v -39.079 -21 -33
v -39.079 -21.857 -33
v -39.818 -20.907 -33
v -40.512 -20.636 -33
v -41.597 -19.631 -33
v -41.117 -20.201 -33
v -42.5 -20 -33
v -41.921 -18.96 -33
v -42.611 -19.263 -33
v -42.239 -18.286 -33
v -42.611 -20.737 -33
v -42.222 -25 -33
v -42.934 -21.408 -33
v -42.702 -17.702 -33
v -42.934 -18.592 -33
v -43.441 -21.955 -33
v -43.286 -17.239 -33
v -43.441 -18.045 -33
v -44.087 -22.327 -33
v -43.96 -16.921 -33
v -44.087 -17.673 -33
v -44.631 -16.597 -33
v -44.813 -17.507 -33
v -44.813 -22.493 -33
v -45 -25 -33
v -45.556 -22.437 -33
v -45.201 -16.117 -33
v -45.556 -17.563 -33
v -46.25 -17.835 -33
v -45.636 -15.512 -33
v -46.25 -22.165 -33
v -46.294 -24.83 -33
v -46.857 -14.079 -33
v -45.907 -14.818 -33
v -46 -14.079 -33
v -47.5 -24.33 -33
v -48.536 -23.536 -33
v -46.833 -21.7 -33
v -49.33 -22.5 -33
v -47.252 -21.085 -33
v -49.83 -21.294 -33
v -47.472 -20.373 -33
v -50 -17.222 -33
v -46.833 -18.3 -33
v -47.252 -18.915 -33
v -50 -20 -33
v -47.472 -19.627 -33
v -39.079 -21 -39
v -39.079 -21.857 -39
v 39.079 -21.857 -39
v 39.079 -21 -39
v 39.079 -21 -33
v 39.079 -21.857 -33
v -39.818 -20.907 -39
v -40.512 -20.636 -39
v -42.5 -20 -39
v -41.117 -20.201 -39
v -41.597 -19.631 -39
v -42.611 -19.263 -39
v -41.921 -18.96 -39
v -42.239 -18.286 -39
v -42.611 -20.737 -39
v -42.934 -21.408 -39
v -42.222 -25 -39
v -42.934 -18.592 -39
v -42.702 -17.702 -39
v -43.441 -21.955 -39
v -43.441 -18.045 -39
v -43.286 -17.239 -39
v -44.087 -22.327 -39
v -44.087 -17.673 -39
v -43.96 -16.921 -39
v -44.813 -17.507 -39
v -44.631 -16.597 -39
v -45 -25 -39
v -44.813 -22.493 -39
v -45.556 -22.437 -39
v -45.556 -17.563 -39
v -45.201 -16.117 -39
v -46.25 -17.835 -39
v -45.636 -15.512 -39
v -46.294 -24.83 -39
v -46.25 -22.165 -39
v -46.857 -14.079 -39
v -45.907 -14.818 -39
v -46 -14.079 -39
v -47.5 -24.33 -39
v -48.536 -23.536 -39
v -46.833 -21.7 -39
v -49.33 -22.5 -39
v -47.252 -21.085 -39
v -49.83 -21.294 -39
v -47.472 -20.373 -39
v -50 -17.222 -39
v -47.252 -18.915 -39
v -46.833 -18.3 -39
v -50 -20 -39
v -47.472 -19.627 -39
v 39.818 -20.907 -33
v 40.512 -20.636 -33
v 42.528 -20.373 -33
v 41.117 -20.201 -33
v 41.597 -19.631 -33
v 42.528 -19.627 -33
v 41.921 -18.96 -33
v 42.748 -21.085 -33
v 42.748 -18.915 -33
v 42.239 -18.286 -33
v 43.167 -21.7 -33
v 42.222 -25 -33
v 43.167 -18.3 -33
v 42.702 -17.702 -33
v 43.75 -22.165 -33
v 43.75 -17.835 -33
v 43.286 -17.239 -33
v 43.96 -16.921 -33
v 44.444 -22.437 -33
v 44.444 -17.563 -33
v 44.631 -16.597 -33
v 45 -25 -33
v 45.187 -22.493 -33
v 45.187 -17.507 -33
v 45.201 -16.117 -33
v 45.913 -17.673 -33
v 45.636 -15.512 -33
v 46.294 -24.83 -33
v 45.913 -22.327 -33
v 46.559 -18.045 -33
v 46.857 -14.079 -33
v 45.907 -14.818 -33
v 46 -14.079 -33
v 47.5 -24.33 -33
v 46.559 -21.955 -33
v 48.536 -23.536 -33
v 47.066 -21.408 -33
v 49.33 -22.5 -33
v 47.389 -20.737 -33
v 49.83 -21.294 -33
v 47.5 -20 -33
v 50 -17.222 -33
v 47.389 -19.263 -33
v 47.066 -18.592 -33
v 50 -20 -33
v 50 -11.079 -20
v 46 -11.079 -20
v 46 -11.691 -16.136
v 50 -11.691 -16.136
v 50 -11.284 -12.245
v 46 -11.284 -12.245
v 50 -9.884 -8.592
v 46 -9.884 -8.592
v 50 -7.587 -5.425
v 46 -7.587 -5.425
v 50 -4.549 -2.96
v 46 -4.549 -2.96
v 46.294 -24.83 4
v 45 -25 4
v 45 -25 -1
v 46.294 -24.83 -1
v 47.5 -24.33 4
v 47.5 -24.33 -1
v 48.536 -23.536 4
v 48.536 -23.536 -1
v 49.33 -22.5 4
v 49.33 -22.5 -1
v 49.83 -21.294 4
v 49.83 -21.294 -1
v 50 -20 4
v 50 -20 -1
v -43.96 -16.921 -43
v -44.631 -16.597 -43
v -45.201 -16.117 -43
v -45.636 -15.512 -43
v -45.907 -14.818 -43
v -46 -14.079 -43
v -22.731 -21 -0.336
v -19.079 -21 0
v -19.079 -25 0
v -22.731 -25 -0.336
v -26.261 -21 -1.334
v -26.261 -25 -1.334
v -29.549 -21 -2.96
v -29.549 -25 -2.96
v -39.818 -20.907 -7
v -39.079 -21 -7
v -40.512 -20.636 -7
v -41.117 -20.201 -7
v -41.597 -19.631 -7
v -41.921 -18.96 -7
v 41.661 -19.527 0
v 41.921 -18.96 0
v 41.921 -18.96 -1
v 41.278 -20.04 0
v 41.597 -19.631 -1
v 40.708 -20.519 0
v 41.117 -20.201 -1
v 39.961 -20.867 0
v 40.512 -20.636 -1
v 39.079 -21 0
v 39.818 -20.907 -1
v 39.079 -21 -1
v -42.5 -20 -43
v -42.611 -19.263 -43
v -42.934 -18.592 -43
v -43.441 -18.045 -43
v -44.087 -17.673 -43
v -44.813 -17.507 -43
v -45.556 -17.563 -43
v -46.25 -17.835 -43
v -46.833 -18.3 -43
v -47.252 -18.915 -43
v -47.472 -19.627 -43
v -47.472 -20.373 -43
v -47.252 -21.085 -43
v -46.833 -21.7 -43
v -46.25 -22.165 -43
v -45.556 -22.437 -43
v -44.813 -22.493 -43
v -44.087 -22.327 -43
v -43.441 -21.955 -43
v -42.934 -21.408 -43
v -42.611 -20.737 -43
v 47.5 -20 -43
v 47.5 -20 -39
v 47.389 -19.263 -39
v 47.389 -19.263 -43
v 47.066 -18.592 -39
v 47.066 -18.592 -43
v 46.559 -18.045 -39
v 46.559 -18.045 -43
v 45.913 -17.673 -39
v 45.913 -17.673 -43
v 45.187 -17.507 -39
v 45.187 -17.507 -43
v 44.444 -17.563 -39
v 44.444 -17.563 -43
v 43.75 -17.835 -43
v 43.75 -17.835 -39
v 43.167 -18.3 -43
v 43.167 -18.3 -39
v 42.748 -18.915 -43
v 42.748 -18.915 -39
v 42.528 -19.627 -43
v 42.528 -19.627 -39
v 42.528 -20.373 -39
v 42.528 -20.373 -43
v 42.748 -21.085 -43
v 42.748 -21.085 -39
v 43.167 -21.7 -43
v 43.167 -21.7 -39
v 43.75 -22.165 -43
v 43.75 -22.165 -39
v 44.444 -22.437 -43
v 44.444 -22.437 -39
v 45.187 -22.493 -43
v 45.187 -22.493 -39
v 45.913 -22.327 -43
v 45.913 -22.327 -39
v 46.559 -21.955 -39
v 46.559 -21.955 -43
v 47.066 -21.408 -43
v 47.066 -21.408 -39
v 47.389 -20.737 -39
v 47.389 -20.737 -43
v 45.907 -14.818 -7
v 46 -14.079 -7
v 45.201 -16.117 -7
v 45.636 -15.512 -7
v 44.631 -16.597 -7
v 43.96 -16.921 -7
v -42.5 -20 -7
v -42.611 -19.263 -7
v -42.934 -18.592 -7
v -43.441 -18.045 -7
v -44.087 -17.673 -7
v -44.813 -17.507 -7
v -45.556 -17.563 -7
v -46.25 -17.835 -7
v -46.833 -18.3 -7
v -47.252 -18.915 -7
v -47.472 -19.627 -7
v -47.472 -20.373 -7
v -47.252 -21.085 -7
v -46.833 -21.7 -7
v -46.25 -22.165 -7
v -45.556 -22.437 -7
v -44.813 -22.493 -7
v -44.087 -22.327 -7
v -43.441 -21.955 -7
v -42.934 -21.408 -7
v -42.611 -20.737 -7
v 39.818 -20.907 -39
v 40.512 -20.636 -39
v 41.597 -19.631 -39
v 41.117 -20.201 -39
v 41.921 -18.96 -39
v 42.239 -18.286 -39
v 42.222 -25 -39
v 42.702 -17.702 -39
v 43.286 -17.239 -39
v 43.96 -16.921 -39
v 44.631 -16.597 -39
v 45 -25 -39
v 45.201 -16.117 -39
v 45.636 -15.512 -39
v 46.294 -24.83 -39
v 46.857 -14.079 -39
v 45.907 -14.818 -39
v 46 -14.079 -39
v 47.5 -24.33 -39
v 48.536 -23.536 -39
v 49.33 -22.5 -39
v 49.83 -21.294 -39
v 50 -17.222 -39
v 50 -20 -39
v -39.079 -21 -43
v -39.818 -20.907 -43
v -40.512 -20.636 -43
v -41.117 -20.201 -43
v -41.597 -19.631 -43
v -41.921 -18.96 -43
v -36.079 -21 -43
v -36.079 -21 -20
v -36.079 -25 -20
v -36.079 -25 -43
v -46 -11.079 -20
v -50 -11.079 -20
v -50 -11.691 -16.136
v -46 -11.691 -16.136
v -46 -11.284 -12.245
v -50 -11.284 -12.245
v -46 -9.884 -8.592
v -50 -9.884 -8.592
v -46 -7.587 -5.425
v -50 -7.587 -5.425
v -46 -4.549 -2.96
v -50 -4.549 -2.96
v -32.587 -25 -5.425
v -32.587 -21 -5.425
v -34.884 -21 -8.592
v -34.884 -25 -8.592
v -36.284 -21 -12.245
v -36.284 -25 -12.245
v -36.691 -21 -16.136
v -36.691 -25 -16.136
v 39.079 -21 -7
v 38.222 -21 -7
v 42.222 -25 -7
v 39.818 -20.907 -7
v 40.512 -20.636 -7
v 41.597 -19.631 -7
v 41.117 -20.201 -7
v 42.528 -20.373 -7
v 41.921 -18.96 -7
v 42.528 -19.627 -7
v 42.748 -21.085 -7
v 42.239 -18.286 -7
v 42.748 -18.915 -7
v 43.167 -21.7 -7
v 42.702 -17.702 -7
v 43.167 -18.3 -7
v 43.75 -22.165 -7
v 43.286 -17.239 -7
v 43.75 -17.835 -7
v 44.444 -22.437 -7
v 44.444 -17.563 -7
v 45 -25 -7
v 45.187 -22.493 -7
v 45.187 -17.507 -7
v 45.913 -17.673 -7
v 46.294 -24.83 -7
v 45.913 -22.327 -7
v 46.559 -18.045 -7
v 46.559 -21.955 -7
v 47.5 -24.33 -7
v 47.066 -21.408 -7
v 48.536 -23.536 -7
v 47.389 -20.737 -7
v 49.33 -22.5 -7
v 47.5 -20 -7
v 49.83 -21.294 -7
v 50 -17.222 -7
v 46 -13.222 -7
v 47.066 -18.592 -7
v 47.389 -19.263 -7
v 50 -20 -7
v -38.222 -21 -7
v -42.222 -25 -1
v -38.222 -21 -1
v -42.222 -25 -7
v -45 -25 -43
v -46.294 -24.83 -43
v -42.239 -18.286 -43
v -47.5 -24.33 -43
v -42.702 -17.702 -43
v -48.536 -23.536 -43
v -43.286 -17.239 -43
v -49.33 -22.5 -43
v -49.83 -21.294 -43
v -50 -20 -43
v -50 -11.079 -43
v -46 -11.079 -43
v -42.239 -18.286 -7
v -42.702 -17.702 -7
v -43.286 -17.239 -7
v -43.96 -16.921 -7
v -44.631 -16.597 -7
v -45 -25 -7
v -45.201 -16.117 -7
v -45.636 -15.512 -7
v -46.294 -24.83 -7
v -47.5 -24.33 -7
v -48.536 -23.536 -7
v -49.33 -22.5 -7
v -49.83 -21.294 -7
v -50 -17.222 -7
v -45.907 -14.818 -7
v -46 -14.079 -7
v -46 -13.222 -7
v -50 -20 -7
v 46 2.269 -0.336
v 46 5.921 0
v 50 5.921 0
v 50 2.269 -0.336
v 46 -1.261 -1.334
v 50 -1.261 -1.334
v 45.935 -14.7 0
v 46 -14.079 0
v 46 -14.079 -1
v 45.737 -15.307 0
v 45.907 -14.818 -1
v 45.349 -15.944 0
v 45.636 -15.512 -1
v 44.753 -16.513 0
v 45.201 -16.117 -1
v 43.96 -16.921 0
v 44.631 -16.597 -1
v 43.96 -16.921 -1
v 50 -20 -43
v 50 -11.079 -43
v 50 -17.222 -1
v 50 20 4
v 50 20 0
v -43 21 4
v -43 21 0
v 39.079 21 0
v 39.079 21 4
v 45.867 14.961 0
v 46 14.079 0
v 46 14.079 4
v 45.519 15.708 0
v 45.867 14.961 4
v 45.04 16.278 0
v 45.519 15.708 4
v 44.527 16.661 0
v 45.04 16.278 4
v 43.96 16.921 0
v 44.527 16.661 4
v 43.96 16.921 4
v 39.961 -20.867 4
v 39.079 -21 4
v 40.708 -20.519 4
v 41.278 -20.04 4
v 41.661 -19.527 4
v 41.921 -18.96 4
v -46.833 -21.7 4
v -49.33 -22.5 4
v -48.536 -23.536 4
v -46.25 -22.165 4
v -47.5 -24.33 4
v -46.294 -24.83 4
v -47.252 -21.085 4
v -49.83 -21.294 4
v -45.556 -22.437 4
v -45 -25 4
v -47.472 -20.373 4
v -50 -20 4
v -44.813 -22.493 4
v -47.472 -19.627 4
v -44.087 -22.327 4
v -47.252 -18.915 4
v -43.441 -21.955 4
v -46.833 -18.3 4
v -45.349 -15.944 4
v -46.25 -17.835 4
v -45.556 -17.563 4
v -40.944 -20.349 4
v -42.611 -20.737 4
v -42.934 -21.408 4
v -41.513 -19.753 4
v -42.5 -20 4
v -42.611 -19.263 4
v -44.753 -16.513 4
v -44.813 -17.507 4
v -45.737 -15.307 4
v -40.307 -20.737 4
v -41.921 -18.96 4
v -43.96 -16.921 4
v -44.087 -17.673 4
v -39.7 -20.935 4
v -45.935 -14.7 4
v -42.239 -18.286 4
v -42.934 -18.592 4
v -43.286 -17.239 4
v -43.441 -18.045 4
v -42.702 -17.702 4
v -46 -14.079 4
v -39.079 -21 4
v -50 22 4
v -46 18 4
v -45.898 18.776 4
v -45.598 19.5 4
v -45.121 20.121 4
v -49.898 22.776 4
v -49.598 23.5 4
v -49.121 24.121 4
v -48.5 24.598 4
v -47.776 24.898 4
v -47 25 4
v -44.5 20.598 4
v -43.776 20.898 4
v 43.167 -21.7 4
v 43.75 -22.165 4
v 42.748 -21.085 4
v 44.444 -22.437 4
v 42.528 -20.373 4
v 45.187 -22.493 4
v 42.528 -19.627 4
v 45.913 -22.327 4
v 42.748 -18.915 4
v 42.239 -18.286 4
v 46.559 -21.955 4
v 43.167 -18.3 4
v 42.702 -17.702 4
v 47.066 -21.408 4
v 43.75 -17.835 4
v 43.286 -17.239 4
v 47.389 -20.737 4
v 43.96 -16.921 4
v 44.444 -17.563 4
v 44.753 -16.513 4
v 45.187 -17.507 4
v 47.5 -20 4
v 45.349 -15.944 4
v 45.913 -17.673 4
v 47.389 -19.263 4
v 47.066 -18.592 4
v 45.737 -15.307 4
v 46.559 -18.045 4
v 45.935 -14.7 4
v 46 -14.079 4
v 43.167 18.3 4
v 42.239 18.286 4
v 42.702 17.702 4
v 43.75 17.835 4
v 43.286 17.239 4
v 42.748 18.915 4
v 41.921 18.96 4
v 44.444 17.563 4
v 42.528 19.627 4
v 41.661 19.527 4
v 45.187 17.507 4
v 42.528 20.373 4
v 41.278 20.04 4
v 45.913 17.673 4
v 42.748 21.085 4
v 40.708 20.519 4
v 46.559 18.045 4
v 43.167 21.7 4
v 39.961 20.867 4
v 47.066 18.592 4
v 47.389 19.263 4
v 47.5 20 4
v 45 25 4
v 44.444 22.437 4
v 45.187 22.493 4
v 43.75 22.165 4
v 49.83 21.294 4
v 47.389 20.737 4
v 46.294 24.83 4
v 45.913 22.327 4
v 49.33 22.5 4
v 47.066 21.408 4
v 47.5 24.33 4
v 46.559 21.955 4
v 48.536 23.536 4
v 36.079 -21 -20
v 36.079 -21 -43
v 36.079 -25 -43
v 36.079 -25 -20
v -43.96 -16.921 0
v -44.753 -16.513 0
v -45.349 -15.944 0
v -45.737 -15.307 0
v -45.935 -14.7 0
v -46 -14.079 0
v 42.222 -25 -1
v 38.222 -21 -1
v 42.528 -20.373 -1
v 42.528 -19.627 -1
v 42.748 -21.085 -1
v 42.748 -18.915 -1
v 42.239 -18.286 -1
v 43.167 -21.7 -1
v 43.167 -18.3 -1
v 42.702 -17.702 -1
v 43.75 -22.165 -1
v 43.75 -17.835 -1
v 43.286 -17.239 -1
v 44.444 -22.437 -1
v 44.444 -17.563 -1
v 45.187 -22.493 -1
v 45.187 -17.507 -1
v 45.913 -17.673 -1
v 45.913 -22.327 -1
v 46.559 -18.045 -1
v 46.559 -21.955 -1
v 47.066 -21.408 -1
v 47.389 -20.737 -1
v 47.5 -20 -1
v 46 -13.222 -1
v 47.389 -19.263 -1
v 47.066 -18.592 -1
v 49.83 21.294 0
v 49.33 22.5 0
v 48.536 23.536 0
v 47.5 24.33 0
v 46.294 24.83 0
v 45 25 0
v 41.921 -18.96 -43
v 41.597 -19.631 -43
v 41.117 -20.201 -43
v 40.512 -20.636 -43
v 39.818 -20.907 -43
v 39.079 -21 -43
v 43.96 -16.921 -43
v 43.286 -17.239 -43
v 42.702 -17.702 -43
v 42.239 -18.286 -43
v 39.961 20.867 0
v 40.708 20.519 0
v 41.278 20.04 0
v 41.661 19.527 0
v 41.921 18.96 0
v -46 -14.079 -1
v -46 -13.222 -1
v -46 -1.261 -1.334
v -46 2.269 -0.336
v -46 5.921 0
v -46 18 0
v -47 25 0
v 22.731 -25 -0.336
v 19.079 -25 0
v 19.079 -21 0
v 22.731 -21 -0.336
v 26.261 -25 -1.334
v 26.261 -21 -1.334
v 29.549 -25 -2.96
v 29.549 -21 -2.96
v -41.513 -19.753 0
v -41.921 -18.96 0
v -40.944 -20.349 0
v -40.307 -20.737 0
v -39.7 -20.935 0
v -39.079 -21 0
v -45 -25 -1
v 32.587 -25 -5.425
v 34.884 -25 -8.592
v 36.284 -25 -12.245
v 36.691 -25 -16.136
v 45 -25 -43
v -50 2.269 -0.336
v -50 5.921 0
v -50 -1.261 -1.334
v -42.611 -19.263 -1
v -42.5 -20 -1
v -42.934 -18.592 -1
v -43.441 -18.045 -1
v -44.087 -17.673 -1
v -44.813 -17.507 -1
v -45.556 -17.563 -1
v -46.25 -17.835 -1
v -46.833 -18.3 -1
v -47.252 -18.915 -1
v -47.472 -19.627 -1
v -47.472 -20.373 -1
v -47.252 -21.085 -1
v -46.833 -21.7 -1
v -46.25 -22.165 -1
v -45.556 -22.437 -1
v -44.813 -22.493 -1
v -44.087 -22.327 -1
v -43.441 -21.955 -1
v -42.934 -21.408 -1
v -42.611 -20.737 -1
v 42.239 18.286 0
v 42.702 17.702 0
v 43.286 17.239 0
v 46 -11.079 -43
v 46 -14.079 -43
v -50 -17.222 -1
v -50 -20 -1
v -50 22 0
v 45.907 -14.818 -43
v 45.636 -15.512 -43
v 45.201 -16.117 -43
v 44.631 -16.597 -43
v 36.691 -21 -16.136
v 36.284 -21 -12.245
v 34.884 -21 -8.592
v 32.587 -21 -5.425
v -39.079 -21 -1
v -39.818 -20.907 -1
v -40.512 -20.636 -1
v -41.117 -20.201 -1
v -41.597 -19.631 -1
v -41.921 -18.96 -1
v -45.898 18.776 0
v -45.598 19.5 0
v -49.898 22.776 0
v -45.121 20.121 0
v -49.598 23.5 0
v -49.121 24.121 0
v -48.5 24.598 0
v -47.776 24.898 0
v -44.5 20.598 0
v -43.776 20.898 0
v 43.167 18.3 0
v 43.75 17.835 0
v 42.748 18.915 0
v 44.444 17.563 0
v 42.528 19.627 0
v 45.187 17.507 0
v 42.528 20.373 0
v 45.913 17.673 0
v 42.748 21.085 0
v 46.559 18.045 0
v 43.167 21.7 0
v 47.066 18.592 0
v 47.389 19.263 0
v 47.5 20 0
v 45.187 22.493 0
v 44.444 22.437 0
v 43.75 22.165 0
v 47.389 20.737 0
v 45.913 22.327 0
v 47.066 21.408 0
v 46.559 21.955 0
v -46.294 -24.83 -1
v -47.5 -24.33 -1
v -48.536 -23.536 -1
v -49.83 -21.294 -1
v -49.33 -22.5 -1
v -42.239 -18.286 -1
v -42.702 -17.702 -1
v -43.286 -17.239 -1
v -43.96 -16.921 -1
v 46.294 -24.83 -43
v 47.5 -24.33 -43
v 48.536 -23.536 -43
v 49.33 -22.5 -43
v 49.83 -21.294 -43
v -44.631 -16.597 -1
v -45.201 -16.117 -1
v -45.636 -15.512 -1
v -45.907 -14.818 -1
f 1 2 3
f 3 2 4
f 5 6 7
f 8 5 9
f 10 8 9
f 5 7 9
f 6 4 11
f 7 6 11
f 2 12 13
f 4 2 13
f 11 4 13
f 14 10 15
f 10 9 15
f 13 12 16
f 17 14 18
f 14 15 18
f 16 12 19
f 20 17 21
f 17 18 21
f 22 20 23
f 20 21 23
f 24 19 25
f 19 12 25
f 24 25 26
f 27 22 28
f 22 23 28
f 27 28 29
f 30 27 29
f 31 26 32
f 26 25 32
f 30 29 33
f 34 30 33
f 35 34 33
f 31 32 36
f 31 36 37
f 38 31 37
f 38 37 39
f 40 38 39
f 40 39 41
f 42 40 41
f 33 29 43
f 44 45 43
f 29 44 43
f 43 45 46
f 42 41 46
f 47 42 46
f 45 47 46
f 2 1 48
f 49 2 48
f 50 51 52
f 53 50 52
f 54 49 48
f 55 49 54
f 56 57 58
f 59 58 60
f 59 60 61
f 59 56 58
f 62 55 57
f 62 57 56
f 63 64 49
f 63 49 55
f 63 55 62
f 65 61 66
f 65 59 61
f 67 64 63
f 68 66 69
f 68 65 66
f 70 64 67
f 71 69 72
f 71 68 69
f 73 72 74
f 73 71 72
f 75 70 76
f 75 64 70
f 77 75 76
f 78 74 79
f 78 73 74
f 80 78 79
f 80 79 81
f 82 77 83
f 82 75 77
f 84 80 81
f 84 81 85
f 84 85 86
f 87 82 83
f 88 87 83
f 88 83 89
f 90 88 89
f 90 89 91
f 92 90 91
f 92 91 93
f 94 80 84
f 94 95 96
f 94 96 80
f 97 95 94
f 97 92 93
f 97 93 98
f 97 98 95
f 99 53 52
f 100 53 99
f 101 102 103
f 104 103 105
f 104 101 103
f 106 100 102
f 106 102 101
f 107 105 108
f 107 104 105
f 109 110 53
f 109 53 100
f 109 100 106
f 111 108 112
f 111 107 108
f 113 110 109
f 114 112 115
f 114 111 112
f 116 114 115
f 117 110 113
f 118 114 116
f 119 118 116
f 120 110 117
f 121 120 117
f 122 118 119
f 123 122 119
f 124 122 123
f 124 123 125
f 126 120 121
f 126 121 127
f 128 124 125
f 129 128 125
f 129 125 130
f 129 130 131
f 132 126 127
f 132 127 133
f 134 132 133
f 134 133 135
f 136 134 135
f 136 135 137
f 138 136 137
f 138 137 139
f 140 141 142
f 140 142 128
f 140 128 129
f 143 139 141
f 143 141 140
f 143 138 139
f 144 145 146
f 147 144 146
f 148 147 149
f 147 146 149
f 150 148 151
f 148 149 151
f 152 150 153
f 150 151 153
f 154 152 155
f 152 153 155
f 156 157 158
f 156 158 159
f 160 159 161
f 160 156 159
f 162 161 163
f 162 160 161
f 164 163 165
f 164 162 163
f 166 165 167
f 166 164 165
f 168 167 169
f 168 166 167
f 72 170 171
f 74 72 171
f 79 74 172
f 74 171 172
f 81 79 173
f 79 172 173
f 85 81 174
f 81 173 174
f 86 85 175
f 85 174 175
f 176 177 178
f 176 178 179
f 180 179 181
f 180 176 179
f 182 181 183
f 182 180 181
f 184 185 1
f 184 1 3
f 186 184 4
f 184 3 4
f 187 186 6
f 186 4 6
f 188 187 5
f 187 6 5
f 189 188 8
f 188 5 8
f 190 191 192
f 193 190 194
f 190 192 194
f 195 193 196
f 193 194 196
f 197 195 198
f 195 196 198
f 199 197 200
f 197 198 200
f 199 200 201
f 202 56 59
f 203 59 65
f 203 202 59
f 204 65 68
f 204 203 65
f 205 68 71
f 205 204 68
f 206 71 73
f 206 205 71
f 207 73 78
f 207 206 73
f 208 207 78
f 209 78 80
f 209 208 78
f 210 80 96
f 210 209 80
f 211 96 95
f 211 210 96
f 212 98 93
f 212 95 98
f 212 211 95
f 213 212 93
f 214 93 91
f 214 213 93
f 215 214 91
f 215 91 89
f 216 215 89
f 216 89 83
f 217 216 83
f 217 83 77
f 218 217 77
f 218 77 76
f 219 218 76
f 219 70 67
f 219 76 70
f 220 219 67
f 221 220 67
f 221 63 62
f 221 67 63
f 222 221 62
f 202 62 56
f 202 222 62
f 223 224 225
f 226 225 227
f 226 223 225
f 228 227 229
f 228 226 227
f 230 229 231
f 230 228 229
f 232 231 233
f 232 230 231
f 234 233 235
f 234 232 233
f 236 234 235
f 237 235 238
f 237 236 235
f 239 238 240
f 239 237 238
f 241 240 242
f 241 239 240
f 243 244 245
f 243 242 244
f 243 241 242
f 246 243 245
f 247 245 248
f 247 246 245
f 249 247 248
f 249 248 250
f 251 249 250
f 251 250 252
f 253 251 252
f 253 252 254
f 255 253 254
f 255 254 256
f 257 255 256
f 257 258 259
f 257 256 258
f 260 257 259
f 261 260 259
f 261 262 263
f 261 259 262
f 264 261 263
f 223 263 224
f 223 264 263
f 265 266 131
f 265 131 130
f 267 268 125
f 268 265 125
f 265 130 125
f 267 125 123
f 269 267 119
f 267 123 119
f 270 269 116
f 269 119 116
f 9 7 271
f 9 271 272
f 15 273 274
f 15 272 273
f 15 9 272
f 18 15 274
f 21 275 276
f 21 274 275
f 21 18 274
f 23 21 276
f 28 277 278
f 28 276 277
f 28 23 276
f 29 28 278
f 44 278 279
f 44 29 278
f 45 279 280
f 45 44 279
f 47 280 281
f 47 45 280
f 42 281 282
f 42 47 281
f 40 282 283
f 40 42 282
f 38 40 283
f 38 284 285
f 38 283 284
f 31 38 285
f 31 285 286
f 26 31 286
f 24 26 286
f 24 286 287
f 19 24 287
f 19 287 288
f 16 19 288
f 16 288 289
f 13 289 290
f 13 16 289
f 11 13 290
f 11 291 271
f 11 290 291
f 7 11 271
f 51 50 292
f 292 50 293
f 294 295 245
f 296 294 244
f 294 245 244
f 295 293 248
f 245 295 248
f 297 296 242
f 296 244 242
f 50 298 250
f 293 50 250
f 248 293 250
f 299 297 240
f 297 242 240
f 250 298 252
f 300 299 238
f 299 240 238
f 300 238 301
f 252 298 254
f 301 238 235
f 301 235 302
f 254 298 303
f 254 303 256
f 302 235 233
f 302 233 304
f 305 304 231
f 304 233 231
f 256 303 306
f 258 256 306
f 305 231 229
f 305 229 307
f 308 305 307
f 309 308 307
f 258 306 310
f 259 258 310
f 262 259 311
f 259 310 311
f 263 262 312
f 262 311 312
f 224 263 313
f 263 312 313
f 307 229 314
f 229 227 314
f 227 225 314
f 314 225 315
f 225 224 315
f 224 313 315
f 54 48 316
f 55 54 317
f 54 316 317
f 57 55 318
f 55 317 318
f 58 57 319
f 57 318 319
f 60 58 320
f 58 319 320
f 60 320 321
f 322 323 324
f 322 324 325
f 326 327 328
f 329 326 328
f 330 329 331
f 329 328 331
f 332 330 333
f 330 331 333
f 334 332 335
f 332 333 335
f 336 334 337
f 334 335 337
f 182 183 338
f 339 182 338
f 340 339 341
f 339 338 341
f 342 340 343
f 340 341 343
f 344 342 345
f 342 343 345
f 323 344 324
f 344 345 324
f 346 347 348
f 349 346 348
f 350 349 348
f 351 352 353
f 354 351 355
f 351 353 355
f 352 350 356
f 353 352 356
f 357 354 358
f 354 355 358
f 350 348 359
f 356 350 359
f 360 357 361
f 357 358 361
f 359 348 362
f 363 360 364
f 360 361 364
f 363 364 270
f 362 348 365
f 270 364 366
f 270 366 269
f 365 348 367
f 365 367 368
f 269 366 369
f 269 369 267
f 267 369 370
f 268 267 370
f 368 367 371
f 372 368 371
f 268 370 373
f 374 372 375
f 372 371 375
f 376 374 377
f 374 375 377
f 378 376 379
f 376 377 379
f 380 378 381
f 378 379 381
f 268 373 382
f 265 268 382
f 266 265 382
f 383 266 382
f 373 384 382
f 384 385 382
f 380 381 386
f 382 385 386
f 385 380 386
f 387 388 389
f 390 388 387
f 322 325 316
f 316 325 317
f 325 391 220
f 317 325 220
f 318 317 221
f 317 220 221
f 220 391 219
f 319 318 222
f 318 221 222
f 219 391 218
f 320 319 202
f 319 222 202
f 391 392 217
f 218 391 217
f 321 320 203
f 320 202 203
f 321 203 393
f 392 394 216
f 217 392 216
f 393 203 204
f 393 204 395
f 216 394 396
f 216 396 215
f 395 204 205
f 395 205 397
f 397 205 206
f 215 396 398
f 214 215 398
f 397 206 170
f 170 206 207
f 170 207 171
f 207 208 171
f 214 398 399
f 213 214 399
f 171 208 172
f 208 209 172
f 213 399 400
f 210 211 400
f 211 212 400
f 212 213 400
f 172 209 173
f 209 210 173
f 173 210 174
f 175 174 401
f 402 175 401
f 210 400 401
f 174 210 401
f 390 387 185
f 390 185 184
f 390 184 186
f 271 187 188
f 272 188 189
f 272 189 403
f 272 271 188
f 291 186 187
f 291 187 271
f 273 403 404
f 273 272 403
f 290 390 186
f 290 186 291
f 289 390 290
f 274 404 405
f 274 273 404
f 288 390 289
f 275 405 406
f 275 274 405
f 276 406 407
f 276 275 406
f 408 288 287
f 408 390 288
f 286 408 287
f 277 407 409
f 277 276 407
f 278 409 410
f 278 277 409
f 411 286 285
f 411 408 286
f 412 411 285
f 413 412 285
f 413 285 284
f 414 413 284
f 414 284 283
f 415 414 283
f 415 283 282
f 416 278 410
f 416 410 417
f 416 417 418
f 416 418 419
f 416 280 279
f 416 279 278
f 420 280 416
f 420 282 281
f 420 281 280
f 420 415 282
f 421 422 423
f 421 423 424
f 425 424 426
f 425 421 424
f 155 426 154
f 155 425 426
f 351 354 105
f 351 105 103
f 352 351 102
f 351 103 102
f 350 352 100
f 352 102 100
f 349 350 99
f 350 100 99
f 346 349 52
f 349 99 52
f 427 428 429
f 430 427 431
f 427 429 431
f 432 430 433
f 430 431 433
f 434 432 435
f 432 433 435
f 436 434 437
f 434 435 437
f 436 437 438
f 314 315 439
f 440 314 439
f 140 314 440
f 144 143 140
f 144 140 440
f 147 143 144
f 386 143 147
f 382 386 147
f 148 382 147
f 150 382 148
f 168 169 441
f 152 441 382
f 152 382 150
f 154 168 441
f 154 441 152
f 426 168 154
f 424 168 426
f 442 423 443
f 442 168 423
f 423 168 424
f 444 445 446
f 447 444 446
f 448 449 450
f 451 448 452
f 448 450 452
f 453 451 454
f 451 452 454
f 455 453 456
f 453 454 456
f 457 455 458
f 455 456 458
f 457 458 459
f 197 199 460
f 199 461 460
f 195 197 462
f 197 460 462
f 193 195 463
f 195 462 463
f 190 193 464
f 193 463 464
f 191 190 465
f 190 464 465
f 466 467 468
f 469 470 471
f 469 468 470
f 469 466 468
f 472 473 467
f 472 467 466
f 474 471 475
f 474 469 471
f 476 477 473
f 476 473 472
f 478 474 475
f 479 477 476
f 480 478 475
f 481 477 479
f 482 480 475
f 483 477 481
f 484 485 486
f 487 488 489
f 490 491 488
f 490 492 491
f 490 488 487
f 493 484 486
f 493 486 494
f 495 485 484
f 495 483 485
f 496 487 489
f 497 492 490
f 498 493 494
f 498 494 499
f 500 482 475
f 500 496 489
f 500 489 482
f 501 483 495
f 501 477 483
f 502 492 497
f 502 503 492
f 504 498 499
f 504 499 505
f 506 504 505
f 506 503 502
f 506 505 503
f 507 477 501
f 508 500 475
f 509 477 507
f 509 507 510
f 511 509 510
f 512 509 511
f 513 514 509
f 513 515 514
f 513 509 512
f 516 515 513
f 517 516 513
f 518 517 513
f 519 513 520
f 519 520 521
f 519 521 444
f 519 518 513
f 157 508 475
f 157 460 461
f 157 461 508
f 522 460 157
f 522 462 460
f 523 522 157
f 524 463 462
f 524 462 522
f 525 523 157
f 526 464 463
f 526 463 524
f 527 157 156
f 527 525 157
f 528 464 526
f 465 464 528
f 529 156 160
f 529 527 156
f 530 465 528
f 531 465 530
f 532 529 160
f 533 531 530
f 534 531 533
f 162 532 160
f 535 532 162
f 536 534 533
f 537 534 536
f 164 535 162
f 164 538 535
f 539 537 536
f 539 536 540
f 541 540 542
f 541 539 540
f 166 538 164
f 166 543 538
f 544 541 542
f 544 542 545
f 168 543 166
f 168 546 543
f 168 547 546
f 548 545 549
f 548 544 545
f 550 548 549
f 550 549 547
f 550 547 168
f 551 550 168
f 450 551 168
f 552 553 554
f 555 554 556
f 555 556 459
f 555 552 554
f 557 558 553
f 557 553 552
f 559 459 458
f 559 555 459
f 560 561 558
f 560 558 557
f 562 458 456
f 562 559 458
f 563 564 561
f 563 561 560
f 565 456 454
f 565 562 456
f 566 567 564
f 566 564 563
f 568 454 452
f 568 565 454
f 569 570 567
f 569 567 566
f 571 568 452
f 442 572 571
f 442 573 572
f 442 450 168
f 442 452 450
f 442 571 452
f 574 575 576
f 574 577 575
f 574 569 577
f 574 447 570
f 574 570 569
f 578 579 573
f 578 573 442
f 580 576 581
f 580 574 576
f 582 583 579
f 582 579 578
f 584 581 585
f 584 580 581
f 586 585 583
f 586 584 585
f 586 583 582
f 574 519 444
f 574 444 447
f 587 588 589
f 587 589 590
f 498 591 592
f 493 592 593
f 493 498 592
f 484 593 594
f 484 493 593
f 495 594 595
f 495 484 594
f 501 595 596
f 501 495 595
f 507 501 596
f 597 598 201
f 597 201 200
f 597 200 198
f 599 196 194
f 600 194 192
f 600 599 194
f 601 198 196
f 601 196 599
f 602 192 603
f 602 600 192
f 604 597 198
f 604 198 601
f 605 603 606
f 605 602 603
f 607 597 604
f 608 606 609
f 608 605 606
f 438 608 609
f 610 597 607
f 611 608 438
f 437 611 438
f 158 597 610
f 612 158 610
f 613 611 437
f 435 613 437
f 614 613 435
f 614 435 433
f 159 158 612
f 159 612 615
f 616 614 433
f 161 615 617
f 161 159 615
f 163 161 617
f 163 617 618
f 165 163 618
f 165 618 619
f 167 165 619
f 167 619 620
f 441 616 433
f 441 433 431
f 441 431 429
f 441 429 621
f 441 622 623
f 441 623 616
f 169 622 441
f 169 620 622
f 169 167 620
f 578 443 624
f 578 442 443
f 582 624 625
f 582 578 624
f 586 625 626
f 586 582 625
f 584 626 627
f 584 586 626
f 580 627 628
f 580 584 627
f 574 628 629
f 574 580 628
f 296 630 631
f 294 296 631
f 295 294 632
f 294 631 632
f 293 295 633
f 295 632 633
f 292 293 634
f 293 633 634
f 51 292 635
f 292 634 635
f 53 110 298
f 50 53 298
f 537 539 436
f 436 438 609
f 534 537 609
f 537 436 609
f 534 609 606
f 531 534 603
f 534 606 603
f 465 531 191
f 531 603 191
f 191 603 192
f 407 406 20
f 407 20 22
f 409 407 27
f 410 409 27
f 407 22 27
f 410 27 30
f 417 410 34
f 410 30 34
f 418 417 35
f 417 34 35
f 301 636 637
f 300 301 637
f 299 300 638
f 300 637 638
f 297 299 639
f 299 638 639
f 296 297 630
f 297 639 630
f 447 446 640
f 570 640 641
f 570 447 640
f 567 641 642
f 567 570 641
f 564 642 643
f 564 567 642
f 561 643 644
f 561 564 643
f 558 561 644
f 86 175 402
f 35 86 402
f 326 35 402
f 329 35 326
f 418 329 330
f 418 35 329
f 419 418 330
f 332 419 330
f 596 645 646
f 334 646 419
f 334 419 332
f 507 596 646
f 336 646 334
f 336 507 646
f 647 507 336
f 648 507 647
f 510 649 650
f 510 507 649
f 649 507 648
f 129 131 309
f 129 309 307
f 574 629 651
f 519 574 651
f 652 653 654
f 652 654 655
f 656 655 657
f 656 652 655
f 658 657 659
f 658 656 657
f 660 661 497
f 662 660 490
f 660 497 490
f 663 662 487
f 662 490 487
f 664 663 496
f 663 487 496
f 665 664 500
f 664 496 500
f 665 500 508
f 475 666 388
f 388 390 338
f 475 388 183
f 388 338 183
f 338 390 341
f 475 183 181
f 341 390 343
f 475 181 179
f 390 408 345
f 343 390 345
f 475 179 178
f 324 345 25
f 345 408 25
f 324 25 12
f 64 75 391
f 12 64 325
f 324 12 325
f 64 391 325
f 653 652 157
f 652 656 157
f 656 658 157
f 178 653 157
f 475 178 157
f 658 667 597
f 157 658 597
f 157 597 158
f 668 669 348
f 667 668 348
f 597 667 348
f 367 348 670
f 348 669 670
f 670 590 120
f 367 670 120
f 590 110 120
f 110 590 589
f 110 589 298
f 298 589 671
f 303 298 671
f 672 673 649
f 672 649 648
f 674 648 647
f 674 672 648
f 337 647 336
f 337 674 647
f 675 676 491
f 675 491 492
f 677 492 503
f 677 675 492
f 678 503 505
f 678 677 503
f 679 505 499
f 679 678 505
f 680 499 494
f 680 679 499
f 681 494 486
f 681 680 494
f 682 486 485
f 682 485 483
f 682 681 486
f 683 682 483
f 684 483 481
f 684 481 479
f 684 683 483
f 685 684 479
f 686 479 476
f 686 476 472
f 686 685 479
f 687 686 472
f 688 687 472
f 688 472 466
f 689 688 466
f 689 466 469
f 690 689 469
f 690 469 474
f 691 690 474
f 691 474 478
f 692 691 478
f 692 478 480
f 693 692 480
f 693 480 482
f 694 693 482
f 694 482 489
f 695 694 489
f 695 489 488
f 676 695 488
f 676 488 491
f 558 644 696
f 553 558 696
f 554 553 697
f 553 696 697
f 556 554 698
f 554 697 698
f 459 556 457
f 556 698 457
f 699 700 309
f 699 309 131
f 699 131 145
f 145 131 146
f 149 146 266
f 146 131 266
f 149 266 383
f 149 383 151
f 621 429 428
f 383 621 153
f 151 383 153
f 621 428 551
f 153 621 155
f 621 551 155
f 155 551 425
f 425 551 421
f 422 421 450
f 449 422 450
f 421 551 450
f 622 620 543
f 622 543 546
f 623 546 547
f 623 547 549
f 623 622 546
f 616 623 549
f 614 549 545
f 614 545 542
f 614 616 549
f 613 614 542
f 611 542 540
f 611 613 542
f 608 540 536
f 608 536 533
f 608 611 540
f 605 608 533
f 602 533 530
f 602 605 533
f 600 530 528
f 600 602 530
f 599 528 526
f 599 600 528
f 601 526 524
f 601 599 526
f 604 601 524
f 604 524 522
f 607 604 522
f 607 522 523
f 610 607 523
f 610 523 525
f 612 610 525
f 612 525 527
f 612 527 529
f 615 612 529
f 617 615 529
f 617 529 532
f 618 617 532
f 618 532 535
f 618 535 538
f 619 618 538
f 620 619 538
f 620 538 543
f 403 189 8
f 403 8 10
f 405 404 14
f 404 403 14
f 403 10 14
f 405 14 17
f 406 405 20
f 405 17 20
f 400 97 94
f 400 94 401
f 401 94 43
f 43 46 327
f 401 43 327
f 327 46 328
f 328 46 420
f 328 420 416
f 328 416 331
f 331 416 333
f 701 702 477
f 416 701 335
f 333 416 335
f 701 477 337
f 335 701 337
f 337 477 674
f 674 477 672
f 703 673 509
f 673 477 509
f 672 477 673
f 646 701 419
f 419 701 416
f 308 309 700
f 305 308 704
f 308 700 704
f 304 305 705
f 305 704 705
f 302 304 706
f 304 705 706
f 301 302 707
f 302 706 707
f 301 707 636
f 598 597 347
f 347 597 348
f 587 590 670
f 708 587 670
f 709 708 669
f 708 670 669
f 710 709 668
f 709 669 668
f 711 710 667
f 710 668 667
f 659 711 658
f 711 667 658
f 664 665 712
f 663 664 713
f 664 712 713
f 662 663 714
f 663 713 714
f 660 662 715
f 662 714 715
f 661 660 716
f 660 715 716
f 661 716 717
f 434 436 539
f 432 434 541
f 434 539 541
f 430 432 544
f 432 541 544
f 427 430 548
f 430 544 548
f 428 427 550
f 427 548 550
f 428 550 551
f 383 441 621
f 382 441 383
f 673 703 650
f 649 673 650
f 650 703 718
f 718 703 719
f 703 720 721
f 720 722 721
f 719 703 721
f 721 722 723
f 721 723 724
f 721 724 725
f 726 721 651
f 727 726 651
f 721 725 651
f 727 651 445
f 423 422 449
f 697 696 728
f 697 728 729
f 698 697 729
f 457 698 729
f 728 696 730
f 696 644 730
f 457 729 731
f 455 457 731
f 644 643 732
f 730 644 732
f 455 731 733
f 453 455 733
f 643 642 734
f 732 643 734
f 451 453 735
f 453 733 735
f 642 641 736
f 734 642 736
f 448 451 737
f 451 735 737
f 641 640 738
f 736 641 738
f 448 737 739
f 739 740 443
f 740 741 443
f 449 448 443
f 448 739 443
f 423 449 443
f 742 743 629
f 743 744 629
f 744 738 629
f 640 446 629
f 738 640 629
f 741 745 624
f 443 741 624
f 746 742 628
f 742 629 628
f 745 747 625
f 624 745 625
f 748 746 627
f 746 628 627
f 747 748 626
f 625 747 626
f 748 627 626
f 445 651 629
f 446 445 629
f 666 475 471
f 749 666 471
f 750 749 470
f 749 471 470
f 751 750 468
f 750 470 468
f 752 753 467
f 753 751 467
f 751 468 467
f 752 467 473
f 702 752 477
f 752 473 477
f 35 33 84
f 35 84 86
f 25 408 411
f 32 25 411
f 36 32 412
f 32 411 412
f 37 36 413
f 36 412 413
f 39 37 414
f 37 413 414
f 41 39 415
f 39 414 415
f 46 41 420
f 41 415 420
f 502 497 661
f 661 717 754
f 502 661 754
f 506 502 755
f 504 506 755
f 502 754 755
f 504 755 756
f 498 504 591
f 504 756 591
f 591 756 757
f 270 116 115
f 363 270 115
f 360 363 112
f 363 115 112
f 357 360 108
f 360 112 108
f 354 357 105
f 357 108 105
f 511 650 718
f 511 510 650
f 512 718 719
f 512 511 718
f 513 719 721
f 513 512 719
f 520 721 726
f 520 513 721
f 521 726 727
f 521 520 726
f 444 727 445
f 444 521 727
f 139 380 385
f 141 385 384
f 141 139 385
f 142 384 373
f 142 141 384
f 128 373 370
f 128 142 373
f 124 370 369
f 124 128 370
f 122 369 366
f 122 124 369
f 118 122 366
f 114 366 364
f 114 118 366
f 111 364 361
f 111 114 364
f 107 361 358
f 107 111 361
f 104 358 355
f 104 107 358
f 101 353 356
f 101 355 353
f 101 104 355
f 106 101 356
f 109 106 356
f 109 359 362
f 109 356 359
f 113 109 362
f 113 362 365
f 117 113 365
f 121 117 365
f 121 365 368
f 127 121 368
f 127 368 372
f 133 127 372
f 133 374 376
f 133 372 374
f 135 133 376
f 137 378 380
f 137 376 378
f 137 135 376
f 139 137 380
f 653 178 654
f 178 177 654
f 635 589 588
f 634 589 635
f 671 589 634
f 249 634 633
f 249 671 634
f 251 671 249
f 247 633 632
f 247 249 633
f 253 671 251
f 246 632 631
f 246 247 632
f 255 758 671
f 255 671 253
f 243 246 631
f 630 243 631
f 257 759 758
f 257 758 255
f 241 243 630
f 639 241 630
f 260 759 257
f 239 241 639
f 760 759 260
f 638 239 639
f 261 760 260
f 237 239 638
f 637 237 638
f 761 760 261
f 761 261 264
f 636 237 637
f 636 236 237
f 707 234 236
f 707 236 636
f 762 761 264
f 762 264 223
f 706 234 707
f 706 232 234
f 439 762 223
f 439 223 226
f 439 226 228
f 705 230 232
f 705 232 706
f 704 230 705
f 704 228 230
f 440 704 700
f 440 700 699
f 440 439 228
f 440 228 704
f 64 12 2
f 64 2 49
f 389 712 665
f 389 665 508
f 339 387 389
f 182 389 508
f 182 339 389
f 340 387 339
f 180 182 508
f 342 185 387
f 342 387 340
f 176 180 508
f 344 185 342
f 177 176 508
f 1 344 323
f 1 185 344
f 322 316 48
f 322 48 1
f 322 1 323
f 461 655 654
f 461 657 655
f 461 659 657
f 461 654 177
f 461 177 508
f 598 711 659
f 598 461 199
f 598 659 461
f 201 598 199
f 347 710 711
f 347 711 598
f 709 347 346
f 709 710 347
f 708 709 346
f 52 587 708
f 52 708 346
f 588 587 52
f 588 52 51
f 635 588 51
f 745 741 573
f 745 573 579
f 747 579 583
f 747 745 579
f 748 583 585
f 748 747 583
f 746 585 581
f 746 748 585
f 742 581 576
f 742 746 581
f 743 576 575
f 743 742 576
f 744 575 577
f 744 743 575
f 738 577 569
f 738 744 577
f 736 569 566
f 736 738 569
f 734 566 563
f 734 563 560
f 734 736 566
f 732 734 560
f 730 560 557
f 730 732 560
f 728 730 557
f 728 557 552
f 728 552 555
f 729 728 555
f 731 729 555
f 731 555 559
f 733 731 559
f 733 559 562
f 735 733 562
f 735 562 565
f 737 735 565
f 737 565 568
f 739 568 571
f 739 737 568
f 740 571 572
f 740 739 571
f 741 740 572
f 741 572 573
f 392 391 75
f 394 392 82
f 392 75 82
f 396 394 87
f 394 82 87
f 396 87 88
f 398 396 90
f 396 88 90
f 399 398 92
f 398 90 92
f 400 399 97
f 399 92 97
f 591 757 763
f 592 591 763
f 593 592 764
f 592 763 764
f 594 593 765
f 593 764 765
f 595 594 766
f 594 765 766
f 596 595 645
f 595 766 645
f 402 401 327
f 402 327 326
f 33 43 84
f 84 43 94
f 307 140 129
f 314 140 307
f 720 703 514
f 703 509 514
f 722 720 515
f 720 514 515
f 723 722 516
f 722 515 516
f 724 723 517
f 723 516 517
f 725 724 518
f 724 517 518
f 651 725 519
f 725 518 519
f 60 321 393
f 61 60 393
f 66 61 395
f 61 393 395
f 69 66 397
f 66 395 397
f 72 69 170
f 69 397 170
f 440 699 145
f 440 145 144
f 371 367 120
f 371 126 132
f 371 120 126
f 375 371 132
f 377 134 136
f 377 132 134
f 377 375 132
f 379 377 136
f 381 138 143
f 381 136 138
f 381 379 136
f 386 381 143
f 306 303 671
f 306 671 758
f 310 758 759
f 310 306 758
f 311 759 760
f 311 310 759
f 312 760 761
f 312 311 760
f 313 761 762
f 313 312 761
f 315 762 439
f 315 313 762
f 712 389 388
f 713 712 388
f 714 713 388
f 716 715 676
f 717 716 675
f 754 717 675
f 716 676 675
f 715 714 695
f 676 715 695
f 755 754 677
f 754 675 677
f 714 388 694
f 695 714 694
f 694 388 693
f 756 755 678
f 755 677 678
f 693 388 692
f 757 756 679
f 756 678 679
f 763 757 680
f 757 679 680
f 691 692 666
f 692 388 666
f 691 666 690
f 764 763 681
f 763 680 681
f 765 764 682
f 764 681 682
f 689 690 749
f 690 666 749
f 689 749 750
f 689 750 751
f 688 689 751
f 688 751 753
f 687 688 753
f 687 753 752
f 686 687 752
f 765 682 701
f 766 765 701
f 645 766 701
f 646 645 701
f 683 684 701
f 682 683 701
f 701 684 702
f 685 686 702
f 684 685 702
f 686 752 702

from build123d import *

# Parameters (mm, degrees)
SKETCH1_R           = 2.5
BOSS_EXTRUDE2_DEPTH = 4
FILLET1_R           = 5
FILLET2_R           = 3
FILLET3_R           = 3
BOSS_EXTRUDE3_START = -47
SKETCH2_R           = 2.5
BOSS_EXTRUDE3_DEPTH = 47
FILLET4_R           = 20
CUT_EXTRUDE1_REACH  = 115.914
SKETCH3_W           = 6
SKETCH3_H           = 11
SKETCH4_W           = 4
SKETCH4_H           = 23
BOSS_EXTRUDE4_DEPTH = 3
FILLET5_START       = -50
FILLET5_DEPTH       = 4
FILLET5_START_2     = 46
FILLET5_2_DEPTH     = 4
SKETCH5_W           = 23
SKETCH5_H           = 4
BOSS_EXTRUDE5_DEPTH = 3
FILLET6_START       = -25
FILLET6_DEPTH       = 4
SKETCH6_W           = 23
SKETCH6_H           = 4
BOSS_EXTRUDE6_DEPTH = 3
FILLET7_START       = -25
FILLET7_DEPTH       = 4


with BuildPart() as part:
    # Sketch1 → Boss-Extrude2 (new body)
    with BuildSketch(Plane.XY):
        Polygon((-50, -25), (-41.75, -25), (41.75, -25), (50, -25), (50, -16.75), (50, 16.75), (50, 25), (41.75, 25), (-50, 25), (-50, -16.75), align=None)
        with Locations((-45, -20)):
            Circle(SKETCH1_R, mode=Mode.SUBTRACT)
        with Locations((45, -20)):
            Circle(SKETCH1_R, mode=Mode.SUBTRACT)
        with BuildLine():
            Line((-45, -16.75), (-46, -16.75))
            Line((-46, -16.75), (-46, 21))
            Line((-46, 21), (41.75, 21))
            Line((41.75, 21), (41.75, 20))
            ThreePointArc((41.75, 20), (42.701902961, 17.701902961), (45, 16.75))
            Line((45, 16.75), (46, 16.75))
            Line((46, 16.75), (46, -16.75))
            Line((46, -16.75), (45, -16.75))
            ThreePointArc((45, -16.75), (42.701902961, -17.701902961), (41.75, -20))
            Line((41.75, -20), (41.75, -21))
            Line((41.75, -21), (-41.75, -21))
            Line((-41.75, -21), (-41.75, -20))
            ThreePointArc((-41.75, -20), (-42.701902961, -17.701902961), (-45, -16.75))
        make_face(mode=Mode.SUBTRACT)
        with Locations((45, 20)):
            Circle(SKETCH1_R, mode=Mode.SUBTRACT)
    extrude(amount=BOSS_EXTRUDE2_DEPTH)

    # Fillet1
    fillet1_edges = [part.edges().sort_by_distance(p)[0] for p in [
        (50, 25, 2),
        (50, -25, 2),
        (-50, -25, 2),
    ]]
    fillet(fillet1_edges, radius=FILLET1_R)

    # Fillet2
    fillet2_edges = [part.edges().sort_by_distance(p)[0] for p in [
        (41.75, 21, 2),
        (46, 16.75, 2),
        (46, -16.75, 2),
        (41.75, -21, 2),
        (-41.75, -21, 2),
        (-46, -16.75, 2),
    ]]
    fillet(fillet2_edges, radius=FILLET2_R)

    # Fillet3
    fillet3_edges = [part.edges().sort_by_distance(p)[0] for p in [
        (-46, 21, 2),
        (-50, 25, 2),
    ]]
    fillet(fillet3_edges, radius=FILLET3_R)

    # Sketch2 → Boss-Extrude3 (add)
    # profile 1 of 2: a face of its own
    with BuildSketch(Plane.XY.offset(4).offset(BOSS_EXTRUDE3_START)):
        with BuildLine():
            Line((-46, -14.078640359), (-50, -14.078640359))
            Line((-50, -14.078640359), (-50, -16.75))
            Line((-50, -16.75), (-50, -20))
            ThreePointArc((-50, -20), (-48.535533906, -23.535533906), (-45, -25))
            Line((-45, -25), (-41.75, -25))
            Line((-41.75, -25), (-39.078640359, -25))
            Line((-39.078640359, -25), (-39.078640359, -21))
            ThreePointArc((-39.078640359, -21), (-40.827925927, -20.437211521), (-41.920892987, -18.96))
            ThreePointArc((-41.920892987, -18.96), (-42.701902961, -17.701902961), (-43.96, -16.920892987))
            ThreePointArc((-43.96, -16.920892987), (-45.437211521, -15.827925927), (-46, -14.078640359))
        make_face()
        with Locations((-45, -20)):
            Circle(SKETCH2_R, mode=Mode.SUBTRACT)
    # profile 2 of 2: a face of its own
    with BuildSketch(Plane.XY.offset(4).offset(BOSS_EXTRUDE3_START)):
        with BuildLine():
            Line((39.078640359, -21), (39.078640359, -25))
            Line((39.078640359, -25), (45, -25))
            ThreePointArc((45, -25), (48.535533906, -23.535533906), (50, -20))
            Line((50, -20), (50, -14.078640359))
            Line((50, -14.078640359), (46, -14.078640359))
            ThreePointArc((46, -14.078640359), (45.437211521, -15.827925927), (43.96, -16.920892987))
            ThreePointArc((43.96, -16.920892987), (42.701902961, -17.701902961), (41.920892987, -18.96))
            ThreePointArc((41.920892987, -18.96), (40.827925927, -20.437211521), (39.078640359, -21))
        make_face()
        with Locations((45, -20)):
            Circle(SKETCH2_R, mode=Mode.SUBTRACT)
    extrude(amount=BOSS_EXTRUDE3_DEPTH)

    # Fillet4
    # the kernel refuses this fillet: 20 mm, written as the material it adds along each edge
    with BuildSketch(Plane(origin=(-50, -14.078640359, 0), x_dir=(0, 1, 0), z_dir=(1, 0, 0)), Plane(origin=(39.078640359, -25, 0), x_dir=(-1, 0, 0), z_dir=(0, 1, 0))) as fillet4_piece_1:
        with BuildLine():
            CenterArc((FILLET4_R, -FILLET4_R), FILLET4_R, 90, 90)
            Line((0, -FILLET4_R), (0, 0))
            Line((0, 0), (FILLET4_R, 0))
        make_face()
    extrude(amount=4)
    with BuildSketch(Plane(origin=(-39.078640359, -21, 0), x_dir=(0, 0, -1), z_dir=(0, -1, 0)), Plane(origin=(46, -14.078640359, 0), x_dir=(0, 0, -1), z_dir=(1, 0, 0))) as fillet4_piece_2:
        with BuildLine():
            CenterArc((FILLET4_R, FILLET4_R), FILLET4_R, 180, 90)
            Line((0, FILLET4_R), (0, 0))
            Line((0, 0), (FILLET4_R, 0))
        make_face()
    extrude(amount=4)

    # Sketch3 → Cut-Extrude1 (cut, up to next)
    with BuildSketch(Plane(origin=(-36.035533906, -36.035533906, 0), x_dir=(0, 0, -1), z_dir=(0.707106781186548, 0.7071067811865471, 0)), mode=Mode.PRIVATE) as cut_extrude1_sk1:
        with Locations((4, 17.67766953)):
            Rectangle(SKETCH3_W, SKETCH3_H)
    cut_extrude1_tool1 = extrude(cut_extrude1_sk1.sketch, amount=CUT_EXTRUDE1_REACH, mode=Mode.PRIVATE) & part.part
    # Sketch3 → Cut-Extrude1 (cut, up to next)
    with BuildSketch(Plane(origin=(-36.035533906, -36.035533906, 0), x_dir=(0, 0, -1), z_dir=(0.707106781186548, 0.7071067811865471, 0)), mode=Mode.PRIVATE) as cut_extrude1_sk2:
        with Locations((36, 17.67766953)):
            Rectangle(SKETCH3_W, SKETCH3_H)
    cut_extrude1_tool2 = extrude(cut_extrude1_sk2.sketch, amount=CUT_EXTRUDE1_REACH, mode=Mode.PRIVATE) & part.part
    cut_extrude1_1 = cut_extrude1_tool1.solids().sort_by_distance((-48.535534, -23.535534, -4))[0]
    add(cut_extrude1_1, mode=Mode.SUBTRACT)
    cut_extrude1_2 = cut_extrude1_tool2.solids().sort_by_distance((-48.535534, -23.535534, -36))[0]
    add(cut_extrude1_2, mode=Mode.SUBTRACT)
    cut_extrude1 = cut_extrude1_1 + cut_extrude1_2  # Cut-Extrude1 as one shape, for the pattern or mirror that repeats it

    # Mirror1: Cut-Extrude1 across plane
    add(cut_extrude1.mirror(Plane(origin=(0, 0, 0), x_dir=(0, 0, 1), z_dir=(1, 0, 0))), mode=Mode.SUBTRACT)

    # Sketch4 → Boss-Extrude4 (add)
    with BuildSketch(Plane(origin=(0, -14.078640359, 0), x_dir=(1, 0, 0), z_dir=(0, 1, 0))):
        with Locations((-48, 31.5)):
            Rectangle(SKETCH4_W, SKETCH4_H)
        with Locations((48, 31.5)):
            Rectangle(SKETCH4_W, SKETCH4_H)
    extrude(amount=BOSS_EXTRUDE4_DEPTH)

    # Fillet5: read off the stored shape, not the designer's step
    # Fillet5 outline → Fillet5 (add)
    with BuildSketch(Plane.YZ.offset(FILLET5_START)):
        with BuildLine():
            ThreePointArc((-11.078640359, -20), (-10.703206123, -10.372818577), (-4.549228594, -2.959847946))
            ThreePointArc((-4.549228594, -2.959847946), (-11.534466961, -10.238129398), (-14.078640359, -20))
            Line((-14.078640359, -20), (-11.078640359, -20))
        make_face()
    extrude(amount=FILLET5_DEPTH)

    # Fillet5 2 outline → Fillet5 2 (add)
    with BuildSketch(Plane.YZ.offset(FILLET5_START_2)):
        with BuildLine():
            ThreePointArc((-11.078640359, -20), (-10.703206123, -10.372818577), (-4.549228594, -2.959847946))
            ThreePointArc((-4.549228594, -2.959847946), (-11.534466961, -10.238129398), (-14.078640359, -20))
            Line((-14.078640359, -20), (-11.078640359, -20))
        make_face()
    extrude(amount=FILLET5_2_DEPTH)

    # Sketch5 → Boss-Extrude5 (add)
    with BuildSketch(Plane(origin=(-39.078640359, 0, 0), x_dir=(0, 0, -1), z_dir=(1, 0, 0))):
        with Locations((31.5, -23)):
            Rectangle(SKETCH5_W, SKETCH5_H)
    extrude(amount=BOSS_EXTRUDE5_DEPTH)

    # Fillet6: read off the stored shape, not the designer's step
    # Fillet6 outline → Fillet6 (add)
    with BuildSketch(Plane(origin=(0, 0, 0), x_dir=(1, 0, 0), z_dir=(0, 1, 0)).offset(FILLET6_START)):
        with BuildLine():
            ThreePointArc((-39.078640359, 20), (-36.534466961, 10.238129398), (-29.549228594, 2.959847946))
            ThreePointArc((-29.549228594, 2.959847946), (-35.703206123, 10.372818577), (-36.078640359, 20))
            Line((-36.078640359, 20), (-39.078640359, 20))
        make_face()
    extrude(amount=FILLET6_DEPTH)

    # Sketch6 → Boss-Extrude6 (add)
    with BuildSketch(Plane.ZY.offset(-39.078640359)):
        with Locations((-31.5, -23)):
            Rectangle(SKETCH6_W, SKETCH6_H)
    extrude(amount=BOSS_EXTRUDE6_DEPTH)

    # Fillet7: read off the stored shape, not the designer's step
    # Fillet7 outline → Fillet7 (add)
    with BuildSketch(Plane(origin=(0, 0, 0), x_dir=(1, 0, 0), z_dir=(0, 1, 0)).offset(FILLET7_START)):
        with BuildLine():
            ThreePointArc((36.078640359, 20), (35.703206123, 10.372818577), (29.549228594, 2.959847946))
            ThreePointArc((29.549228594, 2.959847946), (36.534466961, 10.238129398), (39.078640359, 20))
            Line((39.078640359, 20), (36.078640359, 20))
        make_face()
    extrude(amount=FILLET7_DEPTH)


solid = part.part
